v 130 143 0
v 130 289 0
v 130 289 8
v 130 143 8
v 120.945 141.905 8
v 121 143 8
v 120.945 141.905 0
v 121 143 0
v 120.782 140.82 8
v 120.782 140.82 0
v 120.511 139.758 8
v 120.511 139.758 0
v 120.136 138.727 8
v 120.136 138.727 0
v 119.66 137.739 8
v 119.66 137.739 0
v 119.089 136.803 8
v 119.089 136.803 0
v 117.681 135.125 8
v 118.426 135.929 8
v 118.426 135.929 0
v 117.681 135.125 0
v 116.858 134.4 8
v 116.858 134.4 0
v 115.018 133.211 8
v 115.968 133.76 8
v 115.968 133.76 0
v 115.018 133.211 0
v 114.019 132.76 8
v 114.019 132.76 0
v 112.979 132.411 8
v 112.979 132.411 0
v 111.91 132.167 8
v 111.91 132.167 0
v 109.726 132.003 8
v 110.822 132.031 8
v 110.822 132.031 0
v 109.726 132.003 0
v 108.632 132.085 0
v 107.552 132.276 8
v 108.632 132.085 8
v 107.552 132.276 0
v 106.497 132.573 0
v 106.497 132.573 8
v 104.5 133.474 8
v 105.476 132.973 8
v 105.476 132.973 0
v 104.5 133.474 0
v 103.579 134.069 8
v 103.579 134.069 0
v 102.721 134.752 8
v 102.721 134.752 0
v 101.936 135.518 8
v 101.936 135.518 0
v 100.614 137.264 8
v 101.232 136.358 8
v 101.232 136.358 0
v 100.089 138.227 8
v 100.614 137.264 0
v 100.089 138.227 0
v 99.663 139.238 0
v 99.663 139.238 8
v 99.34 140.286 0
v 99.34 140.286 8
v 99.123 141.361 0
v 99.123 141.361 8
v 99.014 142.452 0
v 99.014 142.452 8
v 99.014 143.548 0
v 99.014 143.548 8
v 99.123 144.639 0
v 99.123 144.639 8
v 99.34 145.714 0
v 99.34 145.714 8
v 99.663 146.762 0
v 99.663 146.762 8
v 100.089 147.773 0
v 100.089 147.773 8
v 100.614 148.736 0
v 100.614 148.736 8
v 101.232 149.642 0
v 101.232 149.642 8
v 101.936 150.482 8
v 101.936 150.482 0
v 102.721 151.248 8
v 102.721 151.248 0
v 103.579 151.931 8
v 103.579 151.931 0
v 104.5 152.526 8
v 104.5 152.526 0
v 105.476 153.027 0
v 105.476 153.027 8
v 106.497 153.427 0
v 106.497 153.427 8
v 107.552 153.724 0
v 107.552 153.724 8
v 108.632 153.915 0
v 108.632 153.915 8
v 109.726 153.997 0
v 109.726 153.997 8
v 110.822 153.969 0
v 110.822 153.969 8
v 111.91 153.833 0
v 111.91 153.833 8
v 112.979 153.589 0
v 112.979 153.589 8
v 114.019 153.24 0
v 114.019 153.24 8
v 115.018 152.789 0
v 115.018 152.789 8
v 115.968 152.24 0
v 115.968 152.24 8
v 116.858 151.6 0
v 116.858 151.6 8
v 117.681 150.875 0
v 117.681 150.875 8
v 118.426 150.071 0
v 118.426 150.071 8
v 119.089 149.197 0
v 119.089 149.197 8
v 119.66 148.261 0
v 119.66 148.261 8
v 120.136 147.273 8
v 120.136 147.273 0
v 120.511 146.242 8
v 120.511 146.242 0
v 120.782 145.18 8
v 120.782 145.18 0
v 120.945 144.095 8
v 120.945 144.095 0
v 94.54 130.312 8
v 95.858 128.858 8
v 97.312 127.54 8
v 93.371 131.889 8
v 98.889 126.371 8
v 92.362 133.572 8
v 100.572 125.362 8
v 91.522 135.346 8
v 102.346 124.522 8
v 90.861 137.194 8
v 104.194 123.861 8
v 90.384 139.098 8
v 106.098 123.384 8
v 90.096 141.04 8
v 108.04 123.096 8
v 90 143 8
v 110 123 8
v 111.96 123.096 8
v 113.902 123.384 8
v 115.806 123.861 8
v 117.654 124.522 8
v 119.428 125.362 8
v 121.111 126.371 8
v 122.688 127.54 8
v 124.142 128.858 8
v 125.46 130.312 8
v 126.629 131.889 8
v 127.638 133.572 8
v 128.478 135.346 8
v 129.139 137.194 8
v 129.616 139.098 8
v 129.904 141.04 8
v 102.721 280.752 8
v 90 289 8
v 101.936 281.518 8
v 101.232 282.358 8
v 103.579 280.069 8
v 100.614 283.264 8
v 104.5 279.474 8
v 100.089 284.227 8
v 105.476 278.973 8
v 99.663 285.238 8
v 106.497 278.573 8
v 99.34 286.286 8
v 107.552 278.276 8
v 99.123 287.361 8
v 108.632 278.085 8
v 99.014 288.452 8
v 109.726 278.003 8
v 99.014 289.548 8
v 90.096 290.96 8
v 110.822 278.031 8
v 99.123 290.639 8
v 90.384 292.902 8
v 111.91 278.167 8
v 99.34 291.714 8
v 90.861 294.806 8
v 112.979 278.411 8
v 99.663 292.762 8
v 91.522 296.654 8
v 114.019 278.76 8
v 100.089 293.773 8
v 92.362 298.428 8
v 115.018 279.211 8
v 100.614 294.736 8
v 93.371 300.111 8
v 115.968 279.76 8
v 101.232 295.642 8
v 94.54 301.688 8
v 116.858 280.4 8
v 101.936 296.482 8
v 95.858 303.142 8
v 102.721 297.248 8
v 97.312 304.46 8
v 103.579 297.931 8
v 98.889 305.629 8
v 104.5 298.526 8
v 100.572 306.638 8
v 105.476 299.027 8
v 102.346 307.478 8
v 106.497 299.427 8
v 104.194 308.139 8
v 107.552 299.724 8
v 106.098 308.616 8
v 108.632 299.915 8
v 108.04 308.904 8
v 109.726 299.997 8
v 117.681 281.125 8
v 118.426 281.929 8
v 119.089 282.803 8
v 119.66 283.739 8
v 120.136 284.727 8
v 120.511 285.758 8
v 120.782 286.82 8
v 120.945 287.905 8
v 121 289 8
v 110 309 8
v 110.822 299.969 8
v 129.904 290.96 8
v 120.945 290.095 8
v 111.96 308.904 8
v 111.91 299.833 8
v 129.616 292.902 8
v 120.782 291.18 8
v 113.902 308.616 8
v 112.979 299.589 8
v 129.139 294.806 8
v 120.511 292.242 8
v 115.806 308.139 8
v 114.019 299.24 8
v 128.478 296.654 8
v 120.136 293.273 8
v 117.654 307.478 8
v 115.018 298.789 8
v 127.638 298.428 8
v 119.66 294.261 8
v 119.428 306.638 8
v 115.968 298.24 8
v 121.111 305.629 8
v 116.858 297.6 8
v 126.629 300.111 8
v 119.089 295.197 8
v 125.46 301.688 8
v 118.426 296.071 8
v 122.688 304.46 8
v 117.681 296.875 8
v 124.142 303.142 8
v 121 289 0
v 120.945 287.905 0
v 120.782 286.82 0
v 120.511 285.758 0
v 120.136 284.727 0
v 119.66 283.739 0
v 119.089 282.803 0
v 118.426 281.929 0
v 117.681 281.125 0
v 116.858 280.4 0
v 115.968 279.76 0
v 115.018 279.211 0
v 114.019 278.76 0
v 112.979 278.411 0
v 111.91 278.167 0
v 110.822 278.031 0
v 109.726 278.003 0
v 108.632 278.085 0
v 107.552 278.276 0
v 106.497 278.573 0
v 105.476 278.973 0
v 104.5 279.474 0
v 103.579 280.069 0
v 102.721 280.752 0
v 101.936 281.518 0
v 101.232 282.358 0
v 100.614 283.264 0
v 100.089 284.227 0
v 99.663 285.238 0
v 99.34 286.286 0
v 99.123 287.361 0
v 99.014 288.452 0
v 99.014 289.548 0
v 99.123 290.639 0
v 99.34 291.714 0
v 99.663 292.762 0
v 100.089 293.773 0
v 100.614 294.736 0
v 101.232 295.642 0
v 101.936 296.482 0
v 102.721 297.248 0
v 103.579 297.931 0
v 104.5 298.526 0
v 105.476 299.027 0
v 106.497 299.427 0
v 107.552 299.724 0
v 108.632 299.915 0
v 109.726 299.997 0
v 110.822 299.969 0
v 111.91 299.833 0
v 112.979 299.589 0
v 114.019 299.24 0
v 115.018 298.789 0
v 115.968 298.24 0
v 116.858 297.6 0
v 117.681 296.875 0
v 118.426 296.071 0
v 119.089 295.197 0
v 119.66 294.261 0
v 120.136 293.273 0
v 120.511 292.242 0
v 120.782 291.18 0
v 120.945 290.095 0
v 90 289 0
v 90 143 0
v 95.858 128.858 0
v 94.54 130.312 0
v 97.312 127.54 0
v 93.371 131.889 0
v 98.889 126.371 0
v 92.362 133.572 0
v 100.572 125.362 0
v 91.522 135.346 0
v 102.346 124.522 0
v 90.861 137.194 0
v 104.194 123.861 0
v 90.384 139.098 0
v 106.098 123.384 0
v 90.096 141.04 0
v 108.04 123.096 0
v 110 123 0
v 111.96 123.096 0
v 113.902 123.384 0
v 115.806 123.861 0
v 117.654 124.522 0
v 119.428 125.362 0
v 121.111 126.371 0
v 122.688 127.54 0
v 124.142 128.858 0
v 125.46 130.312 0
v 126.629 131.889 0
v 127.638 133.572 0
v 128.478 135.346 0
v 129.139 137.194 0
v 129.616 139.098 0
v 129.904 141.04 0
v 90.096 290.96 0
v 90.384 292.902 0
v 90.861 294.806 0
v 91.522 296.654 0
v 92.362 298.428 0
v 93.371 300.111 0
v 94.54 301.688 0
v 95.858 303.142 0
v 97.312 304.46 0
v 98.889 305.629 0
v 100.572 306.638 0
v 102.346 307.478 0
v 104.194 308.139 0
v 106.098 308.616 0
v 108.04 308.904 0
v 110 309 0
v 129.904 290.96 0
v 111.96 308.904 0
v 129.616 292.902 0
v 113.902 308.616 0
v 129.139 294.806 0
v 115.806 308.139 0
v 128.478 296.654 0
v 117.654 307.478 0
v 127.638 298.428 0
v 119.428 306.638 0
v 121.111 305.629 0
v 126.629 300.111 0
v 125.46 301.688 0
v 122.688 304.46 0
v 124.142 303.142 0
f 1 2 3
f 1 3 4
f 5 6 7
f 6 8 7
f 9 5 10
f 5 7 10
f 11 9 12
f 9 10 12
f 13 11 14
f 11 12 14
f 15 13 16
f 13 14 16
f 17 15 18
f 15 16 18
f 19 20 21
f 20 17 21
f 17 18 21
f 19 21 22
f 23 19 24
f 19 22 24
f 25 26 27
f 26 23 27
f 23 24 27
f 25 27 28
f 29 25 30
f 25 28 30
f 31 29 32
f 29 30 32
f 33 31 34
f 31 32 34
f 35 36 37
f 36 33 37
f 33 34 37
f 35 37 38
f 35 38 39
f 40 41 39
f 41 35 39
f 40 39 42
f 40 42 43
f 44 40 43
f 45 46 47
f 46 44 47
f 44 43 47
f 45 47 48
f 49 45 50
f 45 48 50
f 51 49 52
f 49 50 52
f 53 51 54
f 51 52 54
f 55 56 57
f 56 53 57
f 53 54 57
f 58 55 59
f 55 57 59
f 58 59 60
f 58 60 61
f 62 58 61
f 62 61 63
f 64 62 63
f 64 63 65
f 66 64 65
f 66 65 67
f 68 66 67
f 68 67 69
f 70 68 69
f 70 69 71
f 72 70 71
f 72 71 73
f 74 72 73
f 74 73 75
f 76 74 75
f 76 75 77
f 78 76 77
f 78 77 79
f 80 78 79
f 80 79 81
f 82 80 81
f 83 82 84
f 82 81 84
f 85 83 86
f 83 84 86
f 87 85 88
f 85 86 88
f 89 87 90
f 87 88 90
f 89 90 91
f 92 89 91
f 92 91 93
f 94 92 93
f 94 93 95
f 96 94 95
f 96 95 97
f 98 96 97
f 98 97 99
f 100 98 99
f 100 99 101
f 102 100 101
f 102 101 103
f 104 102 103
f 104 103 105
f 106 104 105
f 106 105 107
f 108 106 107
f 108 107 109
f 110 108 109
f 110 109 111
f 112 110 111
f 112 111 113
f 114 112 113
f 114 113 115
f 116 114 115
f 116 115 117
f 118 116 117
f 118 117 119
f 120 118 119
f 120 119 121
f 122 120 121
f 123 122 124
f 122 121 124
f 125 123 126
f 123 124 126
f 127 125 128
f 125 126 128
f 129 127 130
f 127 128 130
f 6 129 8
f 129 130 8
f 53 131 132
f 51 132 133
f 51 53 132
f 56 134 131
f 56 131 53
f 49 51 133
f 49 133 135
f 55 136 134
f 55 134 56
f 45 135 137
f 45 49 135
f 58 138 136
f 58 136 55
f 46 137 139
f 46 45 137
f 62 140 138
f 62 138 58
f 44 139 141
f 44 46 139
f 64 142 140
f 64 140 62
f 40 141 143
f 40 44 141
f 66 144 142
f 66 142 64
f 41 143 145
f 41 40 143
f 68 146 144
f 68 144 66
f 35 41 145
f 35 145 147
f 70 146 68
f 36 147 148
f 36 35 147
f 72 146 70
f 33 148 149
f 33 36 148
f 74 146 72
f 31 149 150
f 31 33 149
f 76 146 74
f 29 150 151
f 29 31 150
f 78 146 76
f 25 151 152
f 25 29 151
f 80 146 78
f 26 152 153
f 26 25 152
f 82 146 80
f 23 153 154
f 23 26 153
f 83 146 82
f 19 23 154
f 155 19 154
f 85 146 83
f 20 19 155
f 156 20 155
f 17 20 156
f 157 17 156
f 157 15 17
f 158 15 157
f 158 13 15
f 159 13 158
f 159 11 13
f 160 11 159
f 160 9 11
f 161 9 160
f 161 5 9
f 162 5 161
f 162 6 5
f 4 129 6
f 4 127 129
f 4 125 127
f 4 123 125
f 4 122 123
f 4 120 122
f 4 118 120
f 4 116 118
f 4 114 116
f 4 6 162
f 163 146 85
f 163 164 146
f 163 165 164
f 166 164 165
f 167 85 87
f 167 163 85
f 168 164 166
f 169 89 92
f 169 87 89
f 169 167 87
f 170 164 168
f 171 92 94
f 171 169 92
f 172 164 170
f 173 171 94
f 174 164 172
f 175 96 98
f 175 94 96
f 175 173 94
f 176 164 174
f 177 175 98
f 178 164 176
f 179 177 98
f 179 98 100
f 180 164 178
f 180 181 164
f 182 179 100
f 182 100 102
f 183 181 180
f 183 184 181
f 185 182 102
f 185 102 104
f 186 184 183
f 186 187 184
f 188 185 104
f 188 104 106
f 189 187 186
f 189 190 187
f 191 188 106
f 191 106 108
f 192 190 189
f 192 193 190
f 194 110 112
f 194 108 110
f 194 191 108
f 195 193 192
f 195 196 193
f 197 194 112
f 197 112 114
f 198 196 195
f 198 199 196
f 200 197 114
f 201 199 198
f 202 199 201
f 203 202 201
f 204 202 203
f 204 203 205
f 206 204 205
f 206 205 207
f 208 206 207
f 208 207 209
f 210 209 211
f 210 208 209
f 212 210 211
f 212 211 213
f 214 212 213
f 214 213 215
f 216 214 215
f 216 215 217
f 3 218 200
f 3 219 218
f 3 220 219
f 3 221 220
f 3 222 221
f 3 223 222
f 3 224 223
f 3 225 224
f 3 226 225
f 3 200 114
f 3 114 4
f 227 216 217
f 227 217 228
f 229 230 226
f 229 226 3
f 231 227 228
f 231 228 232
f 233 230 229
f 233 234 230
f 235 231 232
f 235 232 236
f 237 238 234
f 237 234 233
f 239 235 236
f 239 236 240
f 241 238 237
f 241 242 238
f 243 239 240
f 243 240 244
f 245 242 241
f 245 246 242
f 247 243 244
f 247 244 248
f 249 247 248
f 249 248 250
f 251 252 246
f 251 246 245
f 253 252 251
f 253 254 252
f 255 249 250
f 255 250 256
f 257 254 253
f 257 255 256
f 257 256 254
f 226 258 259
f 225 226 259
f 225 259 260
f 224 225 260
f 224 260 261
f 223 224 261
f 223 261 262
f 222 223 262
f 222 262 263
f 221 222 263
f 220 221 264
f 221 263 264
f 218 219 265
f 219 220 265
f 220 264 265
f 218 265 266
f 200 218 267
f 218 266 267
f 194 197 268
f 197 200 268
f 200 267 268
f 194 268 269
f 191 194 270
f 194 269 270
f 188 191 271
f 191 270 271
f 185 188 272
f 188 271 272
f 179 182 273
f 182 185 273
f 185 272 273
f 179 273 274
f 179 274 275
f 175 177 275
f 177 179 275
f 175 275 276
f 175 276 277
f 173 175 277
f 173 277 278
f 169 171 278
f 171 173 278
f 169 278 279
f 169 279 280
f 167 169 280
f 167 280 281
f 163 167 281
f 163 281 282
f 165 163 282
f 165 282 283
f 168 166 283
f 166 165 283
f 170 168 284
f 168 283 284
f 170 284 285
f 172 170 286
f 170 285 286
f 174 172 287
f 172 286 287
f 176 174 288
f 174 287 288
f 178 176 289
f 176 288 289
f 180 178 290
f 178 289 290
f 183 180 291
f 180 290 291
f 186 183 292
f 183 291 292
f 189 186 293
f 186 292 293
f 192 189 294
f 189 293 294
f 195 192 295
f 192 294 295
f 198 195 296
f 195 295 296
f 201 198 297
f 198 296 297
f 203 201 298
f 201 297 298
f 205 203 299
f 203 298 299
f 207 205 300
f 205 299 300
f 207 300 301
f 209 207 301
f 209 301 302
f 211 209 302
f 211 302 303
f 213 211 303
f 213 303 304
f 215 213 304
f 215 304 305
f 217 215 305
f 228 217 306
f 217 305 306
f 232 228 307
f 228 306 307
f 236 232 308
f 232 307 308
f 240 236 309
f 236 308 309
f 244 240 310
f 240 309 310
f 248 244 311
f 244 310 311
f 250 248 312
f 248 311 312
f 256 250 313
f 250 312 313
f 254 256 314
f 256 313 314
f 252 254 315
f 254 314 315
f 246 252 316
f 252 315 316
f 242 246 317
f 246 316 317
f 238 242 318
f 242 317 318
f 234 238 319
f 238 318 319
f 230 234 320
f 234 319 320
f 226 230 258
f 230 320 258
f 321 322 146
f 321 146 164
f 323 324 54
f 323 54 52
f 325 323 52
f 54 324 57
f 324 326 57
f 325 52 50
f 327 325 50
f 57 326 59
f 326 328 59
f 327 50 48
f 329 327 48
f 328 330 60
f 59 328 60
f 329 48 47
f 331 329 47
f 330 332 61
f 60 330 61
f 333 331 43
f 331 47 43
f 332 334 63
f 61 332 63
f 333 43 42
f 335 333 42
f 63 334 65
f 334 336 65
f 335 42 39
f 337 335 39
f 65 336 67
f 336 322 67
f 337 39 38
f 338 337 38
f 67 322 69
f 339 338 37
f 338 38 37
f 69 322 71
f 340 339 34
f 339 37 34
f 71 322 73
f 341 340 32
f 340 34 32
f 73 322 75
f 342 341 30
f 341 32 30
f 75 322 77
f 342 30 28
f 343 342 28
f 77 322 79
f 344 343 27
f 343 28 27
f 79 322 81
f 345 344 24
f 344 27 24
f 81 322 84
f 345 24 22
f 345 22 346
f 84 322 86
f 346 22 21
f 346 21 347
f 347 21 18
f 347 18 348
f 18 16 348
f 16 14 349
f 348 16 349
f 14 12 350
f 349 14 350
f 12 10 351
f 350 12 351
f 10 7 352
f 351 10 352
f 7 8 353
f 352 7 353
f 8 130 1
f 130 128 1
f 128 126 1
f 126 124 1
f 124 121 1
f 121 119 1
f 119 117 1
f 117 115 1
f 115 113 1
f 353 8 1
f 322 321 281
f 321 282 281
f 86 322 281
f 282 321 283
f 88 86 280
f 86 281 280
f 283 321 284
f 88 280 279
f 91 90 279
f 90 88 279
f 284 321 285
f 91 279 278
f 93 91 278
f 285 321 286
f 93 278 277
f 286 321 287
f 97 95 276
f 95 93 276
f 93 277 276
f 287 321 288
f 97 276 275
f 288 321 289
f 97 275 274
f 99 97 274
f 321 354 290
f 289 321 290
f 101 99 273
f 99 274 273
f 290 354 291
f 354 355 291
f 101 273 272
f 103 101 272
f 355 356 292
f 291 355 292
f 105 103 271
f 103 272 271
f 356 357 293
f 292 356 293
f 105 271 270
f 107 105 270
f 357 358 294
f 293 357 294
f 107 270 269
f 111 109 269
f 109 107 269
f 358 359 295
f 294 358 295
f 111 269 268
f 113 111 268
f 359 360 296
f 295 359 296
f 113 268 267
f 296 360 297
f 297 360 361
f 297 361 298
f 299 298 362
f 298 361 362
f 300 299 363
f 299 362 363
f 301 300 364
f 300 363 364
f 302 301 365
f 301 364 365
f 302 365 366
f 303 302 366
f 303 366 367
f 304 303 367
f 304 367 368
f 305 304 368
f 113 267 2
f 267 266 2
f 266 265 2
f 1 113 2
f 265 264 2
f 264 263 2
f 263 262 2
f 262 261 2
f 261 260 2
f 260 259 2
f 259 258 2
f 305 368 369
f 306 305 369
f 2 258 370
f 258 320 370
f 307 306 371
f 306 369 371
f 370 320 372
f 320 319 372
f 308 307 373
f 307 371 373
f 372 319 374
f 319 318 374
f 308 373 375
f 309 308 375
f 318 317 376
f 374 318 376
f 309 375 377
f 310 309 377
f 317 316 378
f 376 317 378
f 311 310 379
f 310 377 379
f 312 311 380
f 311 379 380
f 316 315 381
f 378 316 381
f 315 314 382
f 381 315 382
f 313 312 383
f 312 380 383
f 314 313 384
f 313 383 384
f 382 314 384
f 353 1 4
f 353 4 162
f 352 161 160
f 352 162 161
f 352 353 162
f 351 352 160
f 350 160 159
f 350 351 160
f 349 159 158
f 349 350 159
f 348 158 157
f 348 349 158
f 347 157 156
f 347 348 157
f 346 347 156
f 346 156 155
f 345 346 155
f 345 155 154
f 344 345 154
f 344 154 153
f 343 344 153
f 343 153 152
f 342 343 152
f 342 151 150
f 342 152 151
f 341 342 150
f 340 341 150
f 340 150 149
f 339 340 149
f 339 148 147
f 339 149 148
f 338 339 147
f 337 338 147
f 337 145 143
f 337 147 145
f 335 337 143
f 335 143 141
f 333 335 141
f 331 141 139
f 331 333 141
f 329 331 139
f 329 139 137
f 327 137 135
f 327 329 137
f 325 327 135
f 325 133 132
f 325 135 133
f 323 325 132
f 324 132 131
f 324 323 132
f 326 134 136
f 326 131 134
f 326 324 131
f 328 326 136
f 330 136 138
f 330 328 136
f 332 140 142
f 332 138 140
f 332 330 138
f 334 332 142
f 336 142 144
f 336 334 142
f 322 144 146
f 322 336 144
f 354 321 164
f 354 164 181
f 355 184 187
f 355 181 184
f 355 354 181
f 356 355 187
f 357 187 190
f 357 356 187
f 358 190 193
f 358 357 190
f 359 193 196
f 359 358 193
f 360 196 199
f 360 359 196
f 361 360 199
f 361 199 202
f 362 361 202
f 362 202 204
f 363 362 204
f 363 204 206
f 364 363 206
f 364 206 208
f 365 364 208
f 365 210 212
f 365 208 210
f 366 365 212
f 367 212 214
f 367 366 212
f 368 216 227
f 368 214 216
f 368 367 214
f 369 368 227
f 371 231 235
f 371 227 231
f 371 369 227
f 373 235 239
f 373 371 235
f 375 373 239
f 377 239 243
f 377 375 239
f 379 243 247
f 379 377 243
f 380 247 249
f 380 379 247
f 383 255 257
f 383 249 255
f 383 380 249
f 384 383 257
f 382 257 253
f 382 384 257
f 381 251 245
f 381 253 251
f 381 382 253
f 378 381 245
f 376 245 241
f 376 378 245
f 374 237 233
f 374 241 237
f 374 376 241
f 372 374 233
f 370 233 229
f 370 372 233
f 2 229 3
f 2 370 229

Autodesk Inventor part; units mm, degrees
ref_plane "YZ Plane" through (0, 0, 0) normal (1, 0, 0) x (0, 1, 0)
ref_plane "XZ Plane" through (0, 0, 0) normal (0, 1, 0) x (-1, 0, 0)
ref_plane "XY Plane" through (0, 0, 0) normal (0, 0, 1) x (1, 0, 0)
sketch "Sketch1" plane through (0, 0, 0) normal (0, 0, 1) x (1, 0, 0)
  line L0 (0, 0) -> (220, 0) construction
  line L1 (220, 0) -> (220, 9) construction
  line L2 (220, 9) -> (0, 9) construction
  line L3 (0, 9) -> (0, 0) construction
  line L4 (0, 9) -> (90.94, 295.0593) construction
  line L5 (129.06, 295.0593) -> (220, 9) construction
  circle A0 centre (110, 289) radius 11 construction
  line L6 (96.1101, 281.616) -> (103.5522, 305.0259) construction
  arc A1 (129.06, 295.0593) -> (90.94, 295.0593) centre (110, 289) ccw construction
  line L7 (99, 275.5567) -> (99, 269.1274) construction
  line L8 (110, 289) -> (110, 143) construction
  line L9 (130, 289) -> (130, 143)
  line L10 (90, 143) -> (90, 289)
  arc A2 (130, 289) -> (90, 289) centre (110, 289) ccw
  arc A3 (90, 143) -> (130, 143) centre (110, 143) ccw
  line L11 (292.2692, 143) -> (292.2692, 247) construction
  line L12 (312.2692, 143) -> (312.2692, 247) construction
  line L13 (272.2692, 247) -> (272.2692, 143) construction
  arc A4 (272.2692, 143) -> (312.2692, 143) centre (292.2692, 143) ccw construction
  arc A5 (312.2692, 247) -> (272.2692, 247) centre (292.2692, 247) ccw construction
  arc A6 (90, 289) -> (130, 289) centre (110, 289) ccw construction
  line L14 (101.1908, 269) -> (118.8092, 269) construction
  line L15 (211.2941, 267) -> (373.2442, 267) construction
  line L16 (211.2941, 143) -> (373.2442, 143) construction
  line L17 (292.2692, 143) -> (292.2692, 39) construction
  line L18 (312.2692, 143) -> (312.2692, 39) construction
  line L19 (272.2692, 39) -> (272.2692, 143) construction
  arc A7 (312.2692, 143) -> (272.2692, 143) centre (292.2692, 143) ccw construction
  arc A8 (272.2692, 39) -> (312.2692, 39) centre (292.2692, 39) ccw construction
  line L20 (211.2941, 19) -> (373.2442, 19) construction
  circle A9 centre (110, 289) radius 11
  circle A10 centre (110, 143) radius 11
  point P0 (110, 0)
  point P1 (110, 216)
  point P2 (110, 309)
  point P3 (292.2692, 195)
  point P4 (110, 269)
  point P5 (110, 269)
  point P6 (292.2692, 267)
  dimension "d0" = 9
  dimension "d1" = 220
  dimension "d2" = 22
  dimension "d3" = 280
  dimension "d4" = 9
  dimension "d7" = 40
  dimension "d8" = 40
  dimension "pendgap" = 2
  dimension "abovethefloor" = 10
  dimension "d11" = 104
  dimension "d12" = 146
  dimension "d14" = 22
extrude "Extrusion2" add sketch "Sketch1" along normal blind 8
properties part number "FirstPendulum"
